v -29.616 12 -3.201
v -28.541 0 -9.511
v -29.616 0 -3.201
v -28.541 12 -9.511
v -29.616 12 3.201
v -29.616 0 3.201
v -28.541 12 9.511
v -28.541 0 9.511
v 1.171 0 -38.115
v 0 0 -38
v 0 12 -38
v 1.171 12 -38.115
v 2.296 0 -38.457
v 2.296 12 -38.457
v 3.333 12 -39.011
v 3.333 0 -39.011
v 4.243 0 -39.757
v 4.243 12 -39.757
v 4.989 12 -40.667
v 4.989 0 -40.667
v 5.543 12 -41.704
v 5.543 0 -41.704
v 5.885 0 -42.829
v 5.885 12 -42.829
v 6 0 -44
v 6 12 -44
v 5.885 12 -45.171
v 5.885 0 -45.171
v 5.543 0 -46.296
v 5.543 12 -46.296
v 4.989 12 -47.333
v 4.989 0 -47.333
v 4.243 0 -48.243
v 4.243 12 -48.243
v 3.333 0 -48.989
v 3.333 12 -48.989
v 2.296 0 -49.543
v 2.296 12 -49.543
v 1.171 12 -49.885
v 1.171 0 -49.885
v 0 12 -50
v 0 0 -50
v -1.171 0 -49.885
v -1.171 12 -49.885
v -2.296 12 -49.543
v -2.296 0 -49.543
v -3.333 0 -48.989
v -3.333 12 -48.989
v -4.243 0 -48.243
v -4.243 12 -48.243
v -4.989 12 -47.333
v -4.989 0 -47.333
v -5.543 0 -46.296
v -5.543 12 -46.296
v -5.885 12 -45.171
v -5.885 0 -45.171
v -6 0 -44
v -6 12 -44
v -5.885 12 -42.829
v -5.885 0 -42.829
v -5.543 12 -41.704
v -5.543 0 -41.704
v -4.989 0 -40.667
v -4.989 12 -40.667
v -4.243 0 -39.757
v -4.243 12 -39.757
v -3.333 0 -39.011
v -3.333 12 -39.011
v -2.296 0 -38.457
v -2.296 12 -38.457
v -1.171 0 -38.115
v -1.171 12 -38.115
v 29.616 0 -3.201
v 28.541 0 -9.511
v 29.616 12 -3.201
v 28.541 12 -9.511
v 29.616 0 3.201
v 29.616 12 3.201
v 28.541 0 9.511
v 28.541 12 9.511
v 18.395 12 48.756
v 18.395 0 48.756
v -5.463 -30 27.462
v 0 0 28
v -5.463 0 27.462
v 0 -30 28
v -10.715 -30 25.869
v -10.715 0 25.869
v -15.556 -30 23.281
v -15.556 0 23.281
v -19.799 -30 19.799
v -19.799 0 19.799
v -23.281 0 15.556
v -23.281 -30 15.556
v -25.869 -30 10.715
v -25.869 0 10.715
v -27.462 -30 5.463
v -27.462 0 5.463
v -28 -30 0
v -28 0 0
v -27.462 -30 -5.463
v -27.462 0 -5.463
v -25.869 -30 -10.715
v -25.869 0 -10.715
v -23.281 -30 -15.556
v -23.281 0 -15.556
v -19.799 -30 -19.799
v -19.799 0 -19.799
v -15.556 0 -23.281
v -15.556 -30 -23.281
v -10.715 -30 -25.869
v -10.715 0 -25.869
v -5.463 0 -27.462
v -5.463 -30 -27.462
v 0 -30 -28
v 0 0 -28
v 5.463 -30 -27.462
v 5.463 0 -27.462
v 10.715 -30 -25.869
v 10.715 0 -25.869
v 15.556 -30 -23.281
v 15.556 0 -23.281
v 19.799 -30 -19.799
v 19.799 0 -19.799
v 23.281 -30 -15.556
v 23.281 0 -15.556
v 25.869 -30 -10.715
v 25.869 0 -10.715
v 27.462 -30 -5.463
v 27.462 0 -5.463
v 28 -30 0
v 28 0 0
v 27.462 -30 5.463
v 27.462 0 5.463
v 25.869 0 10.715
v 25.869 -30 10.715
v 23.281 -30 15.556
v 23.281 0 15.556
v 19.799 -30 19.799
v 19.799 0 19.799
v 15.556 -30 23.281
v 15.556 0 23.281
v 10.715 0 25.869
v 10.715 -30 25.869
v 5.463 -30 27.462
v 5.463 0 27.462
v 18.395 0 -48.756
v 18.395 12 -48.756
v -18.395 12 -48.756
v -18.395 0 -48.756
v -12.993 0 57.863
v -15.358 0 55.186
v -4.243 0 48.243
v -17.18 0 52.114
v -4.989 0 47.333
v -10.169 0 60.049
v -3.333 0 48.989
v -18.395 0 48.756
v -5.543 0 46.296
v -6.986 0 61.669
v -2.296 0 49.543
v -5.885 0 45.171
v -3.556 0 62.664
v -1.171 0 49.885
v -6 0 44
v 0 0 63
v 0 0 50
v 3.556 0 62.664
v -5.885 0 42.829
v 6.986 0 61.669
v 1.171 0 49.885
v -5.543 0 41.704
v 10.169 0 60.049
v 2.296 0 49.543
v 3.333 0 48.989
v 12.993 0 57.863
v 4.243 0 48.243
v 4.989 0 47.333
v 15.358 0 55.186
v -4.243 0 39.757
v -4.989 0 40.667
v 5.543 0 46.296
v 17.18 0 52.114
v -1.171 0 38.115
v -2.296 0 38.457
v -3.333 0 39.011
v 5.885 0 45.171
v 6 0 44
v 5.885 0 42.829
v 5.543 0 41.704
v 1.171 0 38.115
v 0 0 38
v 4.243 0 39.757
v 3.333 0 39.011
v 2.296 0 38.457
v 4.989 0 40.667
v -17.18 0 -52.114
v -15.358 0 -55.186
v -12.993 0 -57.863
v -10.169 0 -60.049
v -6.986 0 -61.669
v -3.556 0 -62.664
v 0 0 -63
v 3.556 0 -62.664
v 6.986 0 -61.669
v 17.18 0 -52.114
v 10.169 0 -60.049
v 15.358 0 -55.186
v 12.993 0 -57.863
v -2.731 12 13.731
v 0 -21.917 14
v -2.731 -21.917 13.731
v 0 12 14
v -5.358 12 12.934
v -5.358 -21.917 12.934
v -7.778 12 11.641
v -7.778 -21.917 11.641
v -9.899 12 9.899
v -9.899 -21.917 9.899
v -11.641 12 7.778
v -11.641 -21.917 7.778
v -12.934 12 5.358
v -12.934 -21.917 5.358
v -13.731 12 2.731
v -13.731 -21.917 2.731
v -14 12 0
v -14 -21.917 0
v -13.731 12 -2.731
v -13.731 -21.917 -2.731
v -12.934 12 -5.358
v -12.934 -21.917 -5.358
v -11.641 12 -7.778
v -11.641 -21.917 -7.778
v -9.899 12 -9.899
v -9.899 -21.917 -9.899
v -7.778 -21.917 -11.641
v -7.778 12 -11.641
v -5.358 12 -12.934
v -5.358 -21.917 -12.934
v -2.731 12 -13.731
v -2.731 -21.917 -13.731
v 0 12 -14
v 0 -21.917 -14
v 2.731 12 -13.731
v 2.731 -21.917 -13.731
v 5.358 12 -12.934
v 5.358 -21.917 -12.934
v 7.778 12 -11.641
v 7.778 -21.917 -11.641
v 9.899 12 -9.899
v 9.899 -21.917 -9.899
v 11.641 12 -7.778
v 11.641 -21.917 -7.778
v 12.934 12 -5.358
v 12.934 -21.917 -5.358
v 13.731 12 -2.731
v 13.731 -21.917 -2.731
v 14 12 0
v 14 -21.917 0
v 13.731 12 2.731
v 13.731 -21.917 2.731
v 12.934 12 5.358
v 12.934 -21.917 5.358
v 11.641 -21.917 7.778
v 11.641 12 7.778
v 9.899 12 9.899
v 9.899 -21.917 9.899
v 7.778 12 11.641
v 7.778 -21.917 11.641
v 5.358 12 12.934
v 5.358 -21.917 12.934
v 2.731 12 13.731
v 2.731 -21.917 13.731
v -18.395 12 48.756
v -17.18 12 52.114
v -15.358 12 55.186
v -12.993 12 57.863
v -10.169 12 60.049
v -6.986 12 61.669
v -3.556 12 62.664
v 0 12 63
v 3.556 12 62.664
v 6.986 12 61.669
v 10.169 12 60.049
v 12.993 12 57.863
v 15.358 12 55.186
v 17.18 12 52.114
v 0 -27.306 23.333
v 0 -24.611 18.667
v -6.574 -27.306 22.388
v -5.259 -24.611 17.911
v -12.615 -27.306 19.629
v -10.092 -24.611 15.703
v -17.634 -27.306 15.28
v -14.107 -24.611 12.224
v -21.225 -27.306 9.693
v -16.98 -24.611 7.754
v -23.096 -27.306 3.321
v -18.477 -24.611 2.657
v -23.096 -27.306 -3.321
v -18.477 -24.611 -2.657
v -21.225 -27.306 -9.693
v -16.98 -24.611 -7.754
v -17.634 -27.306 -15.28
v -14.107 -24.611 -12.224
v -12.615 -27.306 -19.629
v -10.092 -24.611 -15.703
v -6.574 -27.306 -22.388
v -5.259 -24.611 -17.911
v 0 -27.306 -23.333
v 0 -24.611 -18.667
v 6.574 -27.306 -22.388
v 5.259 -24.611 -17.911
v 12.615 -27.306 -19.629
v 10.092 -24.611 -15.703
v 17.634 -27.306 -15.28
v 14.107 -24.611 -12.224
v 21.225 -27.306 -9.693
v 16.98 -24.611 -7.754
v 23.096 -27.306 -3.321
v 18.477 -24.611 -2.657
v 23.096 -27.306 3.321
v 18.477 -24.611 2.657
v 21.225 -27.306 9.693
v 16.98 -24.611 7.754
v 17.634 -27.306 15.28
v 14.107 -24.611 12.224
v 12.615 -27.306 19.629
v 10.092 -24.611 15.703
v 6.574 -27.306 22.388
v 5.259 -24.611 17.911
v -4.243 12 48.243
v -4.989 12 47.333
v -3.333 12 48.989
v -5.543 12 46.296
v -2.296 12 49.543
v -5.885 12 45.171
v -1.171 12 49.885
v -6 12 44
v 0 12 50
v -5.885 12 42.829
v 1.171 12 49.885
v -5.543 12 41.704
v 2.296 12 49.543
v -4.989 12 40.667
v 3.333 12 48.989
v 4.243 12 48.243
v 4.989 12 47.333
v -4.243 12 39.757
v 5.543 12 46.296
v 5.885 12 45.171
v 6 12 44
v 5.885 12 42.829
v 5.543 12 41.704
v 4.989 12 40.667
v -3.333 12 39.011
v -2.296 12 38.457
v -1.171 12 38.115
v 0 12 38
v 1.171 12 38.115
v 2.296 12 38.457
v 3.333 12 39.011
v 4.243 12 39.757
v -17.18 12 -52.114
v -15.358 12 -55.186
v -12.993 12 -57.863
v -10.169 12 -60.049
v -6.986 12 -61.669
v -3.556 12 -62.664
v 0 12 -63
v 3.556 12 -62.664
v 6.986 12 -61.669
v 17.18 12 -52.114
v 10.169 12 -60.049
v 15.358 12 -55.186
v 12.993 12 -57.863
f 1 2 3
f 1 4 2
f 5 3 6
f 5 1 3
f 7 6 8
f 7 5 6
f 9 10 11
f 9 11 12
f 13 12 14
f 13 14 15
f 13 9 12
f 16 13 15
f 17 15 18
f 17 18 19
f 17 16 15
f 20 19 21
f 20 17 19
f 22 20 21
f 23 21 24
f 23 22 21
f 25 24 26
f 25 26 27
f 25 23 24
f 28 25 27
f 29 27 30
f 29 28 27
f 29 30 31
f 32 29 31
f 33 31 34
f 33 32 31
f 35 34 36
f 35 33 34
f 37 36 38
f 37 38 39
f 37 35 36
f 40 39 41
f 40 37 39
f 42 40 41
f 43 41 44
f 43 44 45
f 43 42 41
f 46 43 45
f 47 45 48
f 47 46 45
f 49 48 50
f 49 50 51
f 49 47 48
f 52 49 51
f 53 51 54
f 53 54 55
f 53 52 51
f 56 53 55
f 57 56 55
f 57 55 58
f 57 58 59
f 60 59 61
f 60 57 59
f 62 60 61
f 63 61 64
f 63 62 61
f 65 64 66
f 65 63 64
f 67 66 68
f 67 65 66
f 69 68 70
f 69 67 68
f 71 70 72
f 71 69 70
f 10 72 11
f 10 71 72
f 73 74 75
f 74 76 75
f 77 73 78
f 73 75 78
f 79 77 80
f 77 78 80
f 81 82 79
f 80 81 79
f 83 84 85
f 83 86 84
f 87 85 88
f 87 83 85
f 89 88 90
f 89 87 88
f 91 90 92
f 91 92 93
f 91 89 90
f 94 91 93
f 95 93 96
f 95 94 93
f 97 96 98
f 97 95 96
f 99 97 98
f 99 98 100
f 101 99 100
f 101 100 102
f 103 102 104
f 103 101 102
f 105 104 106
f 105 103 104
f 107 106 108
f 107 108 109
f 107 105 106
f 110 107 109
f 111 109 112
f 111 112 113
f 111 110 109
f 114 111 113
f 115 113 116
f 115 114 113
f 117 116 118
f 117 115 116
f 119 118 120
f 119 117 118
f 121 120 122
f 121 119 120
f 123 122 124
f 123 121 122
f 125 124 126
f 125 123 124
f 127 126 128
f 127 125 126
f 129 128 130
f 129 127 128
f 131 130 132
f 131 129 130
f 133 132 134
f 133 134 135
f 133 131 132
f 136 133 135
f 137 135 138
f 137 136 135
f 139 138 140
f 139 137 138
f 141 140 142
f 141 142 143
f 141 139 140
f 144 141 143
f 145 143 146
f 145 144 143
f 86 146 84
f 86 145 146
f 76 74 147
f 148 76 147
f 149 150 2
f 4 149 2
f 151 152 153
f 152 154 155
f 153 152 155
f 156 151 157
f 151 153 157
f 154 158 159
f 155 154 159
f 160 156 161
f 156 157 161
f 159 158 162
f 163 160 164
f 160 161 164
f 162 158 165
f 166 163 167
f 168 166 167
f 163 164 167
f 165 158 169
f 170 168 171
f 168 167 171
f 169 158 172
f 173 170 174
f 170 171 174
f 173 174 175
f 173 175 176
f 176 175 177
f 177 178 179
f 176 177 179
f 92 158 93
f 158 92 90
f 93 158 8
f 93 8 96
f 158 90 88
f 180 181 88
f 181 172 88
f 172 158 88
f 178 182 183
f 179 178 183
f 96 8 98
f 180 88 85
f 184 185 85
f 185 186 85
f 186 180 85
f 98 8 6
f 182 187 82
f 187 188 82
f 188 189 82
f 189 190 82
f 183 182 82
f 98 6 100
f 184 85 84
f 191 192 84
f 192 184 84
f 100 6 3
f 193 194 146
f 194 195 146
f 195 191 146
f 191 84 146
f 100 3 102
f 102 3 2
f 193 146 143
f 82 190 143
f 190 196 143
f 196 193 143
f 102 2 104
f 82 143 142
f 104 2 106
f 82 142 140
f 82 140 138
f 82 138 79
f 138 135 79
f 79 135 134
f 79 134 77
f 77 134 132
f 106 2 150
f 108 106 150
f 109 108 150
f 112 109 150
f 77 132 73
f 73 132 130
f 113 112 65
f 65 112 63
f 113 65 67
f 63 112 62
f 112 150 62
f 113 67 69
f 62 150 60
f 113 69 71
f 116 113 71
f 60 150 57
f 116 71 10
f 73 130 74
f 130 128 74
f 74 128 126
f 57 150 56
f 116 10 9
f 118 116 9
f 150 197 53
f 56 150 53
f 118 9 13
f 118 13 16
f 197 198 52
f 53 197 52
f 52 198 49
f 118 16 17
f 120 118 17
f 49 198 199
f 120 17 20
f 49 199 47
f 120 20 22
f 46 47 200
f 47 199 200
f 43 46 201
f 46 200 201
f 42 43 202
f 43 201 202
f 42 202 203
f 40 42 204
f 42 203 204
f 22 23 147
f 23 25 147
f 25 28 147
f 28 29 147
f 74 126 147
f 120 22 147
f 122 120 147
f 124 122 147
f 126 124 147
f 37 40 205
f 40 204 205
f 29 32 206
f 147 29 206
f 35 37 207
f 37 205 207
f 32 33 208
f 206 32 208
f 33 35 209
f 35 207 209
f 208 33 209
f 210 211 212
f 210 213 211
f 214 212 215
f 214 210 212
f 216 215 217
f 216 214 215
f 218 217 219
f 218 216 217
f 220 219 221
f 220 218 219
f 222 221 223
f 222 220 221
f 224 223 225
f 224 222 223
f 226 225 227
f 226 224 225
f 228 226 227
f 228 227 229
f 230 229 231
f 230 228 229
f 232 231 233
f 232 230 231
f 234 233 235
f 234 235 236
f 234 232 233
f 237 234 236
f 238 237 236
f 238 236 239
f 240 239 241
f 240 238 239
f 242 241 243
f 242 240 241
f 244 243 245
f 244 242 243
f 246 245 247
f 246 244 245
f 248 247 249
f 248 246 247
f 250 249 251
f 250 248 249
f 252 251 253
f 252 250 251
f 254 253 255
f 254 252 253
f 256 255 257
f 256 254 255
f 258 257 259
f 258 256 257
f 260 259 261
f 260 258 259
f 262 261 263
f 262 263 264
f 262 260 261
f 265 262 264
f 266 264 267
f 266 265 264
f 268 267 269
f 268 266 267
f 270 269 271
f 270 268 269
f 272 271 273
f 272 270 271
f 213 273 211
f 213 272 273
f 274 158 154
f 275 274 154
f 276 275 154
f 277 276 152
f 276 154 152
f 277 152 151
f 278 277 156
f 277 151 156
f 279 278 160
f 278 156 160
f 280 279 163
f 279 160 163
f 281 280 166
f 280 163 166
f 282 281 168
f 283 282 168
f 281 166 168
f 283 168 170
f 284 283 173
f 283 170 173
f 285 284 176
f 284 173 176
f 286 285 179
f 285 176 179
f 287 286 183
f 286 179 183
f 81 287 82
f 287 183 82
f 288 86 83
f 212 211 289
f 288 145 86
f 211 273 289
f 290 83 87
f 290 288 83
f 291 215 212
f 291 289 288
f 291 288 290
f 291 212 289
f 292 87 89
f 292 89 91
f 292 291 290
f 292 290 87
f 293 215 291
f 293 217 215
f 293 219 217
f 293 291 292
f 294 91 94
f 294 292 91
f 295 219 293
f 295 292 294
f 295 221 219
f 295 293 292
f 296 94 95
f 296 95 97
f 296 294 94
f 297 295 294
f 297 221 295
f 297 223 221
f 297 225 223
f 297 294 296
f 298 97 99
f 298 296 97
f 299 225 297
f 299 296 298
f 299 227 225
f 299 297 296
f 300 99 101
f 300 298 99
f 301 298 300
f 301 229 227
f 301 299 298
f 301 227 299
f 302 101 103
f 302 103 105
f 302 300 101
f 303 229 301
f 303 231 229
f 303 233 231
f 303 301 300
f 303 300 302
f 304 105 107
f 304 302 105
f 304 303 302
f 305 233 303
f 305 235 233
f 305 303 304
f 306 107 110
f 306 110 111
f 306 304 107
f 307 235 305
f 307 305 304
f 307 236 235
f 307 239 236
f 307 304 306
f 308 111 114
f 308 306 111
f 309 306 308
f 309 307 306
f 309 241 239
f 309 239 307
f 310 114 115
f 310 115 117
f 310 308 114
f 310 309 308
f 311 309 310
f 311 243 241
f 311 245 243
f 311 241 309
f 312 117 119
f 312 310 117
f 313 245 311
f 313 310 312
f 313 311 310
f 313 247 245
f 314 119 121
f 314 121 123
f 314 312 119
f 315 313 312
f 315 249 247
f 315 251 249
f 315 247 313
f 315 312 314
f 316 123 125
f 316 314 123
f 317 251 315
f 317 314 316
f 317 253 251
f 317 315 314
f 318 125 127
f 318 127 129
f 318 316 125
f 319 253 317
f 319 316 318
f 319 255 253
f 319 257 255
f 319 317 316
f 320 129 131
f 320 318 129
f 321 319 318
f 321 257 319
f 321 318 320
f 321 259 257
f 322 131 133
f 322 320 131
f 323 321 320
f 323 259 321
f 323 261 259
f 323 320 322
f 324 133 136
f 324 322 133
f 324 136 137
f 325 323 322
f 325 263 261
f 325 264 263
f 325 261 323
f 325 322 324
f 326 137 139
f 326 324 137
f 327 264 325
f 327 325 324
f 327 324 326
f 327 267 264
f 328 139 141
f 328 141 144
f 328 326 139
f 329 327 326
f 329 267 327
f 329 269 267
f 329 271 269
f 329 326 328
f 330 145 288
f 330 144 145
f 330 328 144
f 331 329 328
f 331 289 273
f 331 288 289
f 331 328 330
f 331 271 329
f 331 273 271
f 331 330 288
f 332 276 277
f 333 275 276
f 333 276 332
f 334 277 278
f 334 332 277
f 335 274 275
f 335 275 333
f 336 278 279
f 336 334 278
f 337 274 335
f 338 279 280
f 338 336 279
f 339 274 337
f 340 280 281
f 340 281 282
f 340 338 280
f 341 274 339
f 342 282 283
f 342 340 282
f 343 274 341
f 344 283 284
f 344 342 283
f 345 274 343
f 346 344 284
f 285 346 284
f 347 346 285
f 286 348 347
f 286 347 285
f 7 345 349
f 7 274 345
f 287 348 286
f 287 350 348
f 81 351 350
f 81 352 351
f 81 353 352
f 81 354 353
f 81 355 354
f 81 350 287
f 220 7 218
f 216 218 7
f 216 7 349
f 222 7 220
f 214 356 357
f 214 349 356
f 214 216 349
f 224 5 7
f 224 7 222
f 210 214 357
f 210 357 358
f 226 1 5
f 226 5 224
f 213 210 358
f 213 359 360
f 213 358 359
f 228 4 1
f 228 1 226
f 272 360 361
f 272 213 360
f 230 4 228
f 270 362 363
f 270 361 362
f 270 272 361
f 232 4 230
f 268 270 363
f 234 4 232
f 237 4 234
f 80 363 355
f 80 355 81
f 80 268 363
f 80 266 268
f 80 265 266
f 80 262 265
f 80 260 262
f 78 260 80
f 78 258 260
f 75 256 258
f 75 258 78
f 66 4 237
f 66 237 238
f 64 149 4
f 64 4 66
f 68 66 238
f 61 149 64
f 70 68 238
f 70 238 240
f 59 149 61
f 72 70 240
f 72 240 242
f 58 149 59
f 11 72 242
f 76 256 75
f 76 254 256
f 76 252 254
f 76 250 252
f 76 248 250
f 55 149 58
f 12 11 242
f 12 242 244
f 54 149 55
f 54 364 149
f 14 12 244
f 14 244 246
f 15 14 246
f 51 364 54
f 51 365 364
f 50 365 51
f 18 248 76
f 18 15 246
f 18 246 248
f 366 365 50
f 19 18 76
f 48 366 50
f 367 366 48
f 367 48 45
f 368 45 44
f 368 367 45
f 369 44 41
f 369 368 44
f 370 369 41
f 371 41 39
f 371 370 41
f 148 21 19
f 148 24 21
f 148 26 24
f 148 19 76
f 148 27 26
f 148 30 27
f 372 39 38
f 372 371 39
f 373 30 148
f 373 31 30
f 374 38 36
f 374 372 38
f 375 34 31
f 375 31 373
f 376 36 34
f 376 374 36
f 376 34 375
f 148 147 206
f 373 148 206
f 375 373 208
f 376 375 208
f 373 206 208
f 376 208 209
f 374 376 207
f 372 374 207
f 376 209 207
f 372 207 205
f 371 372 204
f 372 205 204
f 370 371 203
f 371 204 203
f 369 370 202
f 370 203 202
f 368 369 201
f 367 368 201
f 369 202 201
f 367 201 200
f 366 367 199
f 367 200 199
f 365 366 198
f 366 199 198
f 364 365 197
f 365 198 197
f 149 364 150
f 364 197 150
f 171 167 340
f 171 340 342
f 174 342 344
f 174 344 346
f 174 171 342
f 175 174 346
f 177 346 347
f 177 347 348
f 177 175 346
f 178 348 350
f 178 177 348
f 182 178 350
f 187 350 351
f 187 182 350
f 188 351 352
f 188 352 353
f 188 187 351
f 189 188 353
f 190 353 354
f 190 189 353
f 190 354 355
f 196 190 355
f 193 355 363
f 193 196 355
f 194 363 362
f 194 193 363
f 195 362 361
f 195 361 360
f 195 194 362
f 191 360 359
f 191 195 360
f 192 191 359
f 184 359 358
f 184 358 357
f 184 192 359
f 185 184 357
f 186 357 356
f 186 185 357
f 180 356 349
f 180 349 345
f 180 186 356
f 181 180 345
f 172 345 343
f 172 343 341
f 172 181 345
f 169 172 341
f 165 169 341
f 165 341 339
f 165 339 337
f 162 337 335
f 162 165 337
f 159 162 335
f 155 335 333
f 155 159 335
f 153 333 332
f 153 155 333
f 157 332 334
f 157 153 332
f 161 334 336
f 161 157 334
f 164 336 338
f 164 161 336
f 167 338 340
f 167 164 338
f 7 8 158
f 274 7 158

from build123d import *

# Parameters (mm, degrees)
SKETCH2_R           = 14
SKETCH2_R_2         = 19
SKETCH2_R_3         = 6
BOSS_EXTRUDE1_DEPTH = 12
FILLET1_R           = 38


with BuildPart() as part:
    # Sketch2 → Boss-Extrude1 (new body)
    # profile 1 of 3: a face of its own
    with BuildSketch(Plane(origin=(0, 0, 0), x_dir=(1, 0, 0), z_dir=(0, 1, 0))):
        with BuildLine():
            Line((31, 0), (18.395196505, 48.755706629))
            ThreePointArc((18.395196505, 48.755706629), (18.848192667, 46.397005048), (19, 44))
            ThreePointArc((19, 44), (-2.397005048, 25.151807333), (-18.395196505, 48.755706629))
            Line((-18.395196505, 48.755706629), (-31, 0))
            Line((-31, 0), (-18.395196505, -48.755706629))
            ThreePointArc((-18.395196505, -48.755706629), (-2.397005048, -25.151807333), (19, -44))
            ThreePointArc((19, -44), (18.848192667, -46.397005048), (18.395196505, -48.755706629))
            Line((18.395196505, -48.755706629), (31, 0))
        make_face()
        with Locations(Location((0, 0, 0), (0, 0, 270))):
            Circle(SKETCH2_R, mode=Mode.SUBTRACT)
    # profile 2 of 3: a face of its own
    with BuildSketch(Plane(origin=(0, 0, 0), x_dir=(1, 0, 0), z_dir=(0, 1, 0))):
        with Locations((0, -44)):
            Circle(SKETCH2_R_2)
        with Locations(Location((0, -44, 0), (0, 0, 270))):
            Circle(SKETCH2_R_3, mode=Mode.SUBTRACT)
    # profile 3 of 3: a face of its own
    with BuildSketch(Plane(origin=(0, 0, 0), x_dir=(1, 0, 0), z_dir=(0, 1, 0))):
        with Locations((0, 44)):
            Circle(SKETCH2_R_2)
        with Locations(Location((0, 44, 0), (0, 0, 270))):
            Circle(SKETCH2_R_3, mode=Mode.SUBTRACT)
    extrude(amount=BOSS_EXTRUDE1_DEPTH)

    # Fillet1
    fillet1_edges = [part.edges().sort_by_distance(p)[0] for p in [
        (-31, 6, 0),
        (31, 6, 0),
    ]]
    fillet(fillet1_edges, radius=FILLET1_R)

    # Sketch3 → Revolve1 (revolve)
    with BuildSketch(Plane.XY, mode=Mode.PRIVATE) as revolve1_sk:
        Polygon((14, 0), (28, 0), (28, -30), (14, -21.917096231), align=None)
    revolve(revolve1_sk.sketch.rotate(Axis((0, 0, 0), (0, -1, 0)), 90), axis=Axis((0, 0, 0), (0, -1, 0)))


solid = part.part
